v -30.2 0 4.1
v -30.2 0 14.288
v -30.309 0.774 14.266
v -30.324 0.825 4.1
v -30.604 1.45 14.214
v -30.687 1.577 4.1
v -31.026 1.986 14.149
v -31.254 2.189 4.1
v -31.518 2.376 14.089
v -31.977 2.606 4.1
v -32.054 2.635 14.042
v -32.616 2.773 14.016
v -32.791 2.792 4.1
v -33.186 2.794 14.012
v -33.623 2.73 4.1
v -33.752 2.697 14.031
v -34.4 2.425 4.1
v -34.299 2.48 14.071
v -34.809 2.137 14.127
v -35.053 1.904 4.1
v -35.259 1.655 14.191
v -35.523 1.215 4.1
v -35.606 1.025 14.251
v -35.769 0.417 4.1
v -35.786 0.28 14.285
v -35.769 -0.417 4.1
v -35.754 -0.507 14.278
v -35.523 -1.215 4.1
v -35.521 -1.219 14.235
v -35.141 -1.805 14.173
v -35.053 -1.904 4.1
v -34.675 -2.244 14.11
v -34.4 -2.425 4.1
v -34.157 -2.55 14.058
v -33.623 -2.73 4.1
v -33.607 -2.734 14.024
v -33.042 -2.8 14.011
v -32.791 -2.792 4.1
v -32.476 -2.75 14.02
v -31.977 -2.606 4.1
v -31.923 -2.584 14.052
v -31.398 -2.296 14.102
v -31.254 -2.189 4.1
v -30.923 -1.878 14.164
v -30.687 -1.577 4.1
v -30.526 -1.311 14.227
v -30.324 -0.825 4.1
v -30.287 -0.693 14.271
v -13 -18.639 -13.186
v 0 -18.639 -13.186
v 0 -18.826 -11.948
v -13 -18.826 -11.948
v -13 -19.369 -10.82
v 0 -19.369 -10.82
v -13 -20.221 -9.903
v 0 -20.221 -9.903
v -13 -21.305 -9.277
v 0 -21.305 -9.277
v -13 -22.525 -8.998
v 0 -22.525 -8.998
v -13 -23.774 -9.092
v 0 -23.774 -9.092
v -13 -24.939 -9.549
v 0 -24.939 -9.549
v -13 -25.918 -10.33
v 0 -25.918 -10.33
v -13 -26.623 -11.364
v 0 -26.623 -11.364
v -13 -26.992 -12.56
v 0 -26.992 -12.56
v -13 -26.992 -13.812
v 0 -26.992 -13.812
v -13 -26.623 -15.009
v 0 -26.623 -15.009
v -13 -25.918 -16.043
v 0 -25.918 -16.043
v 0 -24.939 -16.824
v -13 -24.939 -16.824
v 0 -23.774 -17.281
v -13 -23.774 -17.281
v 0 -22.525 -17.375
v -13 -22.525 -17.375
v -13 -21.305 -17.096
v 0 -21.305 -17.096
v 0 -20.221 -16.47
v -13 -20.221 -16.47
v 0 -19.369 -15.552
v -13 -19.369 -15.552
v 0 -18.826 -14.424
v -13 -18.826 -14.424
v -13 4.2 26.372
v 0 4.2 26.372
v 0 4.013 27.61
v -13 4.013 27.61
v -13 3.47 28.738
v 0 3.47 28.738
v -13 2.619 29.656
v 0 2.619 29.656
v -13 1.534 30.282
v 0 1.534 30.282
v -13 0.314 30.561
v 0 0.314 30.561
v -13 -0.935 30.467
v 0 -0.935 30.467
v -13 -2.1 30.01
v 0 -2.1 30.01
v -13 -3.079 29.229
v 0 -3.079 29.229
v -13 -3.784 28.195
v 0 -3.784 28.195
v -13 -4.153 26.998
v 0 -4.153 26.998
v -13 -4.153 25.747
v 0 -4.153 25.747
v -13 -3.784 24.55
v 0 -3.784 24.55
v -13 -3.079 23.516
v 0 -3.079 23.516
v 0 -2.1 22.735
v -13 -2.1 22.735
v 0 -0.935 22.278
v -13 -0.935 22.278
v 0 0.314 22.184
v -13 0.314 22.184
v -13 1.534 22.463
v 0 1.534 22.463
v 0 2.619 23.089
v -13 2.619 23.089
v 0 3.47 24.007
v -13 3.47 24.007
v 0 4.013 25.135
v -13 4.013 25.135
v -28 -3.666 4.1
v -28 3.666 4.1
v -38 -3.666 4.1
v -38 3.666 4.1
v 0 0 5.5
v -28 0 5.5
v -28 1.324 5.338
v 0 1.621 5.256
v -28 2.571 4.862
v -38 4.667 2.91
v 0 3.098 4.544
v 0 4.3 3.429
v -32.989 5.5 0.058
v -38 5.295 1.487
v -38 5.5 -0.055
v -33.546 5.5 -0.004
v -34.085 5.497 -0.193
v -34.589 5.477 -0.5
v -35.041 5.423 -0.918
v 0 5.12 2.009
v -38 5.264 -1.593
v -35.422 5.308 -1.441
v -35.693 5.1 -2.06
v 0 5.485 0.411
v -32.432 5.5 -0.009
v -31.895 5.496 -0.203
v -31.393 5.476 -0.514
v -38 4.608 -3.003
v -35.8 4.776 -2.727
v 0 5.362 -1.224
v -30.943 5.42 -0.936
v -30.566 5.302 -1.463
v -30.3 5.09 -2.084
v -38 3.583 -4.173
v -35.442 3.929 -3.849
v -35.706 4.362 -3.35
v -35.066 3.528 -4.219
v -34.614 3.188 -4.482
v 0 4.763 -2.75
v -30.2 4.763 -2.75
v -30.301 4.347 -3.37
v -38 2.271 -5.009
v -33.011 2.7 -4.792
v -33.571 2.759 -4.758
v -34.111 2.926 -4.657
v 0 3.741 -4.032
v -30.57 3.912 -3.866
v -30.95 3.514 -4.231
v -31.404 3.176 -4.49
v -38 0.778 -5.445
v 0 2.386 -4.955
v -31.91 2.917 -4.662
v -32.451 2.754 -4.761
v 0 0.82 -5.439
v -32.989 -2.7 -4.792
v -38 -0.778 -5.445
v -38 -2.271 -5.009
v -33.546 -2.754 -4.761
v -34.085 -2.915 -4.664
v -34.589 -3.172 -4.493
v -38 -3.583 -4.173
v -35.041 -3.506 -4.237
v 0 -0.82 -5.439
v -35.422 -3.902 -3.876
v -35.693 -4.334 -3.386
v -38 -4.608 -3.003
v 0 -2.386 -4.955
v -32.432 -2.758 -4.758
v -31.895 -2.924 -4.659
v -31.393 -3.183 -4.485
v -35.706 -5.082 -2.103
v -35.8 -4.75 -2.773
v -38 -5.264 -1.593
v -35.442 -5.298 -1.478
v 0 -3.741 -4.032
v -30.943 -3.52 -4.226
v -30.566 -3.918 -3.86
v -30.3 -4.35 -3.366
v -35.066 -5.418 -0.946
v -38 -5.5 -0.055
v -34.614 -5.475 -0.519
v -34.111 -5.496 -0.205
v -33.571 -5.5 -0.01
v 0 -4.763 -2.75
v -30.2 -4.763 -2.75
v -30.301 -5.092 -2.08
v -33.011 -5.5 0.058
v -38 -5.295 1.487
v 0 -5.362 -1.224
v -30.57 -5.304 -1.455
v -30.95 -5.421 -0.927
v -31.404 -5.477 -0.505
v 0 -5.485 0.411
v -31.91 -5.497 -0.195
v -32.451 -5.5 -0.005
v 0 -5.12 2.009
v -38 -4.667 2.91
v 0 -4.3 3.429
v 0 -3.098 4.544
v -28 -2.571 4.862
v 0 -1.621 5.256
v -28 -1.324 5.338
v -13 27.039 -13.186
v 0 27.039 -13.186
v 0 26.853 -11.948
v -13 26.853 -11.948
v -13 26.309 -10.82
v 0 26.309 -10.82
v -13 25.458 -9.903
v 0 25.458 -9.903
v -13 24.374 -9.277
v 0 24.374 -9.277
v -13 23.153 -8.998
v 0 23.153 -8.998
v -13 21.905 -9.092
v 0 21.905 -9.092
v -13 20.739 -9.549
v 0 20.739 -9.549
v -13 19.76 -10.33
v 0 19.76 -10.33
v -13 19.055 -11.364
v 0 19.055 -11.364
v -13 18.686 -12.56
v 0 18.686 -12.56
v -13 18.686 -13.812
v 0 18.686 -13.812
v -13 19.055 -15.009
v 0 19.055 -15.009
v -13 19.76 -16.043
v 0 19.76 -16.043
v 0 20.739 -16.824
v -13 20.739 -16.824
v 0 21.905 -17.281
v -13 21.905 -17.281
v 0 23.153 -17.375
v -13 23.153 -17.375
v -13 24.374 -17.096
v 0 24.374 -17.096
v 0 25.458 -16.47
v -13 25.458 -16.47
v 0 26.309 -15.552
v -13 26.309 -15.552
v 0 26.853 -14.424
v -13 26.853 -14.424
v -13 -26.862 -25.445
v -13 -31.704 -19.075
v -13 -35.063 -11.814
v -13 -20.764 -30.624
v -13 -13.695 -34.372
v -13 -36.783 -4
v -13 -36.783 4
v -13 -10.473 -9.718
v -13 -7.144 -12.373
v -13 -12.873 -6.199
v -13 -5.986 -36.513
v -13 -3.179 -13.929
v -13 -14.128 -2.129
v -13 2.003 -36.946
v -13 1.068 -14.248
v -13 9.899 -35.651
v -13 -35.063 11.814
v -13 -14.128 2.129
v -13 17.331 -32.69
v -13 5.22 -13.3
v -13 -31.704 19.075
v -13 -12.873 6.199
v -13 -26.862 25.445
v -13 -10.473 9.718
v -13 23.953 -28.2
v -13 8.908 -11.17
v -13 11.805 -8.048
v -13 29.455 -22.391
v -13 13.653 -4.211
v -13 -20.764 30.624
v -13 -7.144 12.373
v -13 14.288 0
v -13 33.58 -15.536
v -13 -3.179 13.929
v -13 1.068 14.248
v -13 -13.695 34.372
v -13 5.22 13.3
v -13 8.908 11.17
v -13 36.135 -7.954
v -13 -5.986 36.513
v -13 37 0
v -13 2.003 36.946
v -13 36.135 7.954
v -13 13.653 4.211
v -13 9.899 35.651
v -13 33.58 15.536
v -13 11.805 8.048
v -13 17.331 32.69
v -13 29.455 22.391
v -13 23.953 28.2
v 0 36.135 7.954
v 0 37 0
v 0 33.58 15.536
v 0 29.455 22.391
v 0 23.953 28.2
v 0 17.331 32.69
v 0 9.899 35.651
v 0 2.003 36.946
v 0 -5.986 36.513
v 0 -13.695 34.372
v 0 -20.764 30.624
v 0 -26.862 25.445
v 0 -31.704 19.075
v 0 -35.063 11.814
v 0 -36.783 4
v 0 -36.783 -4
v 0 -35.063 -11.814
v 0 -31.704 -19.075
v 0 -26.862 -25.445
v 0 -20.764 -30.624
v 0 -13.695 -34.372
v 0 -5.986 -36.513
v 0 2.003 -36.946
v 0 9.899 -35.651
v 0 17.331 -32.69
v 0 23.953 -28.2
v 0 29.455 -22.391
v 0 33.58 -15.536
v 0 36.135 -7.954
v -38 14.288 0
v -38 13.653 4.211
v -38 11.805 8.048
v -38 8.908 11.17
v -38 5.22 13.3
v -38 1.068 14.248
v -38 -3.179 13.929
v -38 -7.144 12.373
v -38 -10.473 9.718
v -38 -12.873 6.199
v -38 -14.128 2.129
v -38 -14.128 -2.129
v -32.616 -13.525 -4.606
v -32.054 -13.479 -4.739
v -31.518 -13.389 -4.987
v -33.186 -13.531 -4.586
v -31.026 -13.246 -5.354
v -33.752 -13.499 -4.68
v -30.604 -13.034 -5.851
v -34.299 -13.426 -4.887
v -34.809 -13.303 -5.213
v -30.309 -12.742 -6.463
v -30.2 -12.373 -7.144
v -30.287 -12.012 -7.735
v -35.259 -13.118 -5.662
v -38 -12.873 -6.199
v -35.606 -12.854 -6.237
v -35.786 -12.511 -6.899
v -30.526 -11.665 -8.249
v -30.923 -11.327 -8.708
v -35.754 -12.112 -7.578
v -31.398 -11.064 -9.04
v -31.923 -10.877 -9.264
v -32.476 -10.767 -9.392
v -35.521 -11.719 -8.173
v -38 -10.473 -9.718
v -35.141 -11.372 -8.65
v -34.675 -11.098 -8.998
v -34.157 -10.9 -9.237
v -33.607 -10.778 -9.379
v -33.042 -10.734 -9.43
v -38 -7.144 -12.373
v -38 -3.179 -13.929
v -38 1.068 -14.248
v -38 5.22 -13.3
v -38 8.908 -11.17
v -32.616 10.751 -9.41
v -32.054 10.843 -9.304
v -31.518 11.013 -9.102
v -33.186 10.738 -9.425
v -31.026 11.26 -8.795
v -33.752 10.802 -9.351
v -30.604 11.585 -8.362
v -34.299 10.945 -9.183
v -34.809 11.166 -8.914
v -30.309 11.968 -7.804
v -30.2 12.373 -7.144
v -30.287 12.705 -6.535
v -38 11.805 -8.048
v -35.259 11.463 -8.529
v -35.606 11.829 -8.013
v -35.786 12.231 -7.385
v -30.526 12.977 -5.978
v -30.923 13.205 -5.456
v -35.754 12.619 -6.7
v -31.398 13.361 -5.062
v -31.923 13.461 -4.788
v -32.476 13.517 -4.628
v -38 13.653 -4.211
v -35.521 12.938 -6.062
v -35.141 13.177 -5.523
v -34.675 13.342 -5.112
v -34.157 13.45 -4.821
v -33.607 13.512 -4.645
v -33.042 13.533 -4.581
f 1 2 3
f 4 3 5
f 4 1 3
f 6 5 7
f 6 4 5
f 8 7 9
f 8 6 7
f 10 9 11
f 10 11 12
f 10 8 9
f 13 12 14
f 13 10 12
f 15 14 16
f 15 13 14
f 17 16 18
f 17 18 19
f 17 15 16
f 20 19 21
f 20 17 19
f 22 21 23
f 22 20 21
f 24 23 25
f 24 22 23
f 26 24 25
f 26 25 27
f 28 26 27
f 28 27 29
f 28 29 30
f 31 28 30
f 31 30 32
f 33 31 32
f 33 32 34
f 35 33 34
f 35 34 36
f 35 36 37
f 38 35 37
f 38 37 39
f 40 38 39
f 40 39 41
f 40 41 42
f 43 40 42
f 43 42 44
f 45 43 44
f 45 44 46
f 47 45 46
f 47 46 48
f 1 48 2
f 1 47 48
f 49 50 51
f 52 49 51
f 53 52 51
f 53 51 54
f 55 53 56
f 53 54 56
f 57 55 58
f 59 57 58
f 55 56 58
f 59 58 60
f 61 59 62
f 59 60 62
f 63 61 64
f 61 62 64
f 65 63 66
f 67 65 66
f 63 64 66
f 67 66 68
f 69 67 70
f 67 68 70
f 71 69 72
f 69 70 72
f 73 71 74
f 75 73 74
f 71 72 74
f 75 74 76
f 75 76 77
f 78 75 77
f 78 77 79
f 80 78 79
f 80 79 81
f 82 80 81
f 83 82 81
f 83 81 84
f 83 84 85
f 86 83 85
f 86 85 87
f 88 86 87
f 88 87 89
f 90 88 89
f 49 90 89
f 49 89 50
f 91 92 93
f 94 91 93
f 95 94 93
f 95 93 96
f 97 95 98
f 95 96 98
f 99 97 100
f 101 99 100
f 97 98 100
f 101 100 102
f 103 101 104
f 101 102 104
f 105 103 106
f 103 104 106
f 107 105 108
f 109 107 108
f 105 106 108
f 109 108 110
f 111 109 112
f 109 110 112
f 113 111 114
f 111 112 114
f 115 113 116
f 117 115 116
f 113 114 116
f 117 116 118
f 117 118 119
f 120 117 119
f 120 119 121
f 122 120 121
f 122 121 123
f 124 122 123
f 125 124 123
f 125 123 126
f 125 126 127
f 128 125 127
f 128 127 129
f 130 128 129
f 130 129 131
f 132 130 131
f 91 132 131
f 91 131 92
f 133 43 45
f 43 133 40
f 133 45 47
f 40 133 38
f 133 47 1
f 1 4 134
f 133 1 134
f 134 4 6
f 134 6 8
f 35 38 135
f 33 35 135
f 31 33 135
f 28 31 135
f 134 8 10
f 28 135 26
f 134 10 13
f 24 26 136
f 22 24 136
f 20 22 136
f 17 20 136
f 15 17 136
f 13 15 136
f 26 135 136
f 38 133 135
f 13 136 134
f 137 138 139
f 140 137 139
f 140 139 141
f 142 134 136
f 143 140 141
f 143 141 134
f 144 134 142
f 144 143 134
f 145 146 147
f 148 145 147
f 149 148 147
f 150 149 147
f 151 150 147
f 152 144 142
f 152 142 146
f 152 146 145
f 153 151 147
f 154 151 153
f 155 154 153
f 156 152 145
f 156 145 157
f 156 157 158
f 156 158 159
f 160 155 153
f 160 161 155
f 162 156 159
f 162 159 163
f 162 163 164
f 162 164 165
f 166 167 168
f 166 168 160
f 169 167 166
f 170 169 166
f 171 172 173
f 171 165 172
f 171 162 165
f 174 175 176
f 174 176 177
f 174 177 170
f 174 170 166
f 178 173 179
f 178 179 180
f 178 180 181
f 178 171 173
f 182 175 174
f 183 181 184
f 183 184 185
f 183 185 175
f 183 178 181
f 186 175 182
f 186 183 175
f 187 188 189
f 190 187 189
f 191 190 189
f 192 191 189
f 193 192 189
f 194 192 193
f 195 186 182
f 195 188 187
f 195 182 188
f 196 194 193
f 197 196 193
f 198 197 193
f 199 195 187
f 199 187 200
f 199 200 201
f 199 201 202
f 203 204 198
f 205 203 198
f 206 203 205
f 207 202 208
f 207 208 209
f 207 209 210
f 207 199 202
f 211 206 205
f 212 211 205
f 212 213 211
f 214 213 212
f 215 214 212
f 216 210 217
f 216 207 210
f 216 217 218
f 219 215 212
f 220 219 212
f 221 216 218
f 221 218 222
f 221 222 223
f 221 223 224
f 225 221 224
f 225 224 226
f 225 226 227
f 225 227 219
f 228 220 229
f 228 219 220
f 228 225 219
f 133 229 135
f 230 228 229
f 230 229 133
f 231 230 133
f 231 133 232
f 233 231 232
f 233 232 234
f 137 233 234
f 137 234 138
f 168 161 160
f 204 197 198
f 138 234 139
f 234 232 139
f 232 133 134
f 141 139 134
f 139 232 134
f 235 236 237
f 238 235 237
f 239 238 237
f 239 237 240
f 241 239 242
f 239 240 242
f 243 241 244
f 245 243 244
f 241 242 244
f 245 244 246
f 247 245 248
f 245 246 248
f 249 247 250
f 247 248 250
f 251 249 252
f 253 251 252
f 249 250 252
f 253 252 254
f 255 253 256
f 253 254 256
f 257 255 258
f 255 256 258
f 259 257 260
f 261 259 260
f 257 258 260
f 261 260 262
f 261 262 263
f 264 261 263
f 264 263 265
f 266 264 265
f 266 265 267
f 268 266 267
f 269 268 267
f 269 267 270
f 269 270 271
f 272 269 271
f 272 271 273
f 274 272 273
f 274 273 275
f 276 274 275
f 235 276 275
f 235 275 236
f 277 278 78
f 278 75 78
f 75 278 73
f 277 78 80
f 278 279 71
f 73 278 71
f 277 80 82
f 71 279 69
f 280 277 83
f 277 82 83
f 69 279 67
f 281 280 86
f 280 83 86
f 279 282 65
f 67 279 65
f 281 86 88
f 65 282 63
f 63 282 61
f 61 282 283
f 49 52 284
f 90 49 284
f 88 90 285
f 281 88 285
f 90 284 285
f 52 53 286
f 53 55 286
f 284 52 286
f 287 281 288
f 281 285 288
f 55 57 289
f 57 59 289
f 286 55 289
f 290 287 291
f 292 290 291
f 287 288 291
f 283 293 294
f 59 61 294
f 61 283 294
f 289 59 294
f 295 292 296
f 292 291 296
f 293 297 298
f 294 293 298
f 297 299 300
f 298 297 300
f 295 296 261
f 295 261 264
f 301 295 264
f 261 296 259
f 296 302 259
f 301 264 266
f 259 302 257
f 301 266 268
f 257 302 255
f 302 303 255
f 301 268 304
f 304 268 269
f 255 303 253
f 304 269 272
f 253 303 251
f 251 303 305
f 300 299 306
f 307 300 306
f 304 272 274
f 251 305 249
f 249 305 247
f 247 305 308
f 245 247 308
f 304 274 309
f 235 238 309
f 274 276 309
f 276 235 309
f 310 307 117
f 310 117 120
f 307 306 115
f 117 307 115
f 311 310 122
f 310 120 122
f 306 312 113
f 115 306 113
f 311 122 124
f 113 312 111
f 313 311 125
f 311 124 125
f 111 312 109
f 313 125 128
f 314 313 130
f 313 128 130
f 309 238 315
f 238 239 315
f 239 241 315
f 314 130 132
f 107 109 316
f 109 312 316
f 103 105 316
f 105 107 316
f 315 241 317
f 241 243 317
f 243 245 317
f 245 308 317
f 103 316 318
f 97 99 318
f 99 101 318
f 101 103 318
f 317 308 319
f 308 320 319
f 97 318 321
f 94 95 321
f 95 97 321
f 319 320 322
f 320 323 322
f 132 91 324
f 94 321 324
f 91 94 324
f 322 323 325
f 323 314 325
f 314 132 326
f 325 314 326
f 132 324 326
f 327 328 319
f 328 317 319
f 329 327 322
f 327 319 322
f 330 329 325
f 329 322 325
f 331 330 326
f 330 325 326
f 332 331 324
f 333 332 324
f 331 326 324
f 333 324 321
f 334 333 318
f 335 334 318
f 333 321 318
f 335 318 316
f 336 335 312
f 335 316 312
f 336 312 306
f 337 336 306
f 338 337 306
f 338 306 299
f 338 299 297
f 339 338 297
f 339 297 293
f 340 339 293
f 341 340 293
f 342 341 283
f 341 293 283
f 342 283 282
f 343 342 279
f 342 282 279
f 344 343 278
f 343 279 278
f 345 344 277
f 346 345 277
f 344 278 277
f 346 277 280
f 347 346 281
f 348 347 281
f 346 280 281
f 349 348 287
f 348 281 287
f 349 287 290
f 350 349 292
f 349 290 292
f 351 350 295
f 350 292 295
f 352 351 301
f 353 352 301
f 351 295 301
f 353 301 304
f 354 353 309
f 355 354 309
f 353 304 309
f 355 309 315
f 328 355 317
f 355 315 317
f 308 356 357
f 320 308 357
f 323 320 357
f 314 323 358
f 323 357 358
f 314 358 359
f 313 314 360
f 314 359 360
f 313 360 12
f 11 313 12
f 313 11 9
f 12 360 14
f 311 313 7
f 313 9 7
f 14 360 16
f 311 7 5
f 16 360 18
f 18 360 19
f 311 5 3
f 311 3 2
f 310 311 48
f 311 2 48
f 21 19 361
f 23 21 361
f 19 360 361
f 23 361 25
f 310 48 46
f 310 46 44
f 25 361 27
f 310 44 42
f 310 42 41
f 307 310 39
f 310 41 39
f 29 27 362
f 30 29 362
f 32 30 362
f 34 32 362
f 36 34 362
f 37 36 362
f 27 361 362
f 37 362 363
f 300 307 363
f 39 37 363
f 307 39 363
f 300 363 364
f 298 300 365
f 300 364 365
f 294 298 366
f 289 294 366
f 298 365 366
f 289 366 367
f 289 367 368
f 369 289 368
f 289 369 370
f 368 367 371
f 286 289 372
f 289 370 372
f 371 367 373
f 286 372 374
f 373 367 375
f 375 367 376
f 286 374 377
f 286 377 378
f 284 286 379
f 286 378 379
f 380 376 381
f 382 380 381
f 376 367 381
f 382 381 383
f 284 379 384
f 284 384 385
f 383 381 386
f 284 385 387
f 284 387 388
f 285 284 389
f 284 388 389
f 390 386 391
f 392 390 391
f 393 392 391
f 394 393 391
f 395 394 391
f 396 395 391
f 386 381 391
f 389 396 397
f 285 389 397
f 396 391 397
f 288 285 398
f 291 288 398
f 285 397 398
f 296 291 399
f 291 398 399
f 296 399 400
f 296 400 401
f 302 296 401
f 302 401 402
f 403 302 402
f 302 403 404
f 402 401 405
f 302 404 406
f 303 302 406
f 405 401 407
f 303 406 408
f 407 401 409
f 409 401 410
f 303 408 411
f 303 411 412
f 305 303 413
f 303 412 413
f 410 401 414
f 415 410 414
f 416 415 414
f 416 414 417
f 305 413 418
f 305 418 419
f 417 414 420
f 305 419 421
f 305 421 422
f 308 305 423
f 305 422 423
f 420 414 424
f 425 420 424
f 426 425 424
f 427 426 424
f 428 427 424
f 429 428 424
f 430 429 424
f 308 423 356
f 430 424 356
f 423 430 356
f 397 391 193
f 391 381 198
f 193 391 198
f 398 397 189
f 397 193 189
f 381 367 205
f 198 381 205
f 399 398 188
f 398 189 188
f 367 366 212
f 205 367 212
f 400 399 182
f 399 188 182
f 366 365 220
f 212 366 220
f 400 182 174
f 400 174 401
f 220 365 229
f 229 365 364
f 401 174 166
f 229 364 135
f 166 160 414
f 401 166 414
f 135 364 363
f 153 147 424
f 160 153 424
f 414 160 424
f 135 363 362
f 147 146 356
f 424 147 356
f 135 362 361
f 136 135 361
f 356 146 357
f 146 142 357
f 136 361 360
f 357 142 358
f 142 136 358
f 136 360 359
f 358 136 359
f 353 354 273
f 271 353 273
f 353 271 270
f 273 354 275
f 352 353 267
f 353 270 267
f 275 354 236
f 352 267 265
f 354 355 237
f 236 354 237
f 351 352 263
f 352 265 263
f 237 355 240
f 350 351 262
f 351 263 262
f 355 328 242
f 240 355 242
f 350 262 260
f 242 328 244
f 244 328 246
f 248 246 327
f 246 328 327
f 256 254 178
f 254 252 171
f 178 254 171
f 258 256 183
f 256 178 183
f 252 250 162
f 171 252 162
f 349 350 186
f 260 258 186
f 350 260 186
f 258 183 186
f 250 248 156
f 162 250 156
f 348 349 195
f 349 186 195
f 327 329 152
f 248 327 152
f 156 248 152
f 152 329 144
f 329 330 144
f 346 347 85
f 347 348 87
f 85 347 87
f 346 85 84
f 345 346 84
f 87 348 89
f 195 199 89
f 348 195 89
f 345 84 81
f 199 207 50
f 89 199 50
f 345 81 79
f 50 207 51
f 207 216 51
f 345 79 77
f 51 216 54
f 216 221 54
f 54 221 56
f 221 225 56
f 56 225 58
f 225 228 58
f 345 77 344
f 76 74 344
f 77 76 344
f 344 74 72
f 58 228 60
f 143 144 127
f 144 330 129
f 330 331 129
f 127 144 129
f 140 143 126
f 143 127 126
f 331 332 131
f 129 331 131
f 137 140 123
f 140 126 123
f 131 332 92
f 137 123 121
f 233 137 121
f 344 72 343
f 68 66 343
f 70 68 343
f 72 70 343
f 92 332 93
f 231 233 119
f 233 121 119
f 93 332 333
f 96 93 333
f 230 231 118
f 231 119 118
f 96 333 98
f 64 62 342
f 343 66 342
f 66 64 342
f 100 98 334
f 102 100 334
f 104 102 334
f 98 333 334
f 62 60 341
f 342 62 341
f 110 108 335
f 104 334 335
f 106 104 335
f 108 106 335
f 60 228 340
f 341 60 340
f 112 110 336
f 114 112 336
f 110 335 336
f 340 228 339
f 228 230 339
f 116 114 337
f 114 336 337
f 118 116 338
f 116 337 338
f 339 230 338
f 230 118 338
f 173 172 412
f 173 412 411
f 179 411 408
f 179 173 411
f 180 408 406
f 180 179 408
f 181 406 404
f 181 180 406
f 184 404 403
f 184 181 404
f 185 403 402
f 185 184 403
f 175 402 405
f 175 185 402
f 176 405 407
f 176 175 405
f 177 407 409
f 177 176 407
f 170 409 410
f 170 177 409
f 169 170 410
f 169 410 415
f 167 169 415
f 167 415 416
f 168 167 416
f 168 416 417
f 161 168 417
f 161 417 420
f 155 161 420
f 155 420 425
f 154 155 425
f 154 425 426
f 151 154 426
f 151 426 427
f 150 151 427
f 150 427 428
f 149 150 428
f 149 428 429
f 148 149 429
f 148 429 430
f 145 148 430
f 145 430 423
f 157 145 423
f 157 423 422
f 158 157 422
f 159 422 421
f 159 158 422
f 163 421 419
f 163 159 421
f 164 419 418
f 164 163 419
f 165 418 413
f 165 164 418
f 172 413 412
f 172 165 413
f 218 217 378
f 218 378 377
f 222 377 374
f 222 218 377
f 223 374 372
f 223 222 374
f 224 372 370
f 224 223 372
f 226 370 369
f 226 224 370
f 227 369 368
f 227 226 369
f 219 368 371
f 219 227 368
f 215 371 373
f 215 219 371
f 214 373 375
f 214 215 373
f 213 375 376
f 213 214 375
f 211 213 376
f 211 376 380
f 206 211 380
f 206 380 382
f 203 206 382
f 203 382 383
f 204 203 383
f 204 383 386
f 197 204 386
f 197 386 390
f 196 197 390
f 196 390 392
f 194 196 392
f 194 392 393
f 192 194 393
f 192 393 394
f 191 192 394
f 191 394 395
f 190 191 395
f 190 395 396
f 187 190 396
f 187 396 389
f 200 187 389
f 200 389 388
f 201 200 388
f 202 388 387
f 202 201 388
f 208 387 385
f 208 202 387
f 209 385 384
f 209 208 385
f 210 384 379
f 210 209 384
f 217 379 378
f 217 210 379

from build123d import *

# Parameters (mm, degrees)
CYLINDER_R              = 2.8
CYLINDER_DEPTH          = 100
ARRAY_COUNT             = 3
CYLINDER001_R           = 5.5
CYLINDER001_DEPTH       = 38
CYLINDER001_PITCH_ANGLE = -90
SKETCH003_W             = 6
SKETCH003_H             = 20
POCKET_DEPTH            = 10
SKETCH002_R             = 4.2
PAD_DEPTH               = 38


with BuildPart() as set_screw_array:
    # Cylinder → Cylinder (new body)
    with BuildSketch(Plane(origin=(-33, 0, 0), x_dir=(1, 0, 0), z_dir=(0, 0, 1))):
        Circle(CYLINDER_R)
    extrude(amount=CYLINDER_DEPTH)

    # Array: Set Screw Array ×3 about axis
    array_axis = Axis((0, 0, 0), (1, 0, 0))


with BuildPart() as set_screw_array_1:
    add(set_screw_array.part)
    for i in range(1, ARRAY_COUNT):
        add(set_screw_array.part.rotate(array_axis, i * 360 / ARRAY_COUNT))


with BuildPart() as pocket:
    # Cylinder001 → Cylinder001 (new body)
    with BuildSketch(Plane.XY):
        Circle(CYLINDER001_R)
    extrude(amount=CYLINDER001_DEPTH)


with BuildPart() as pocket_1:
    # Cylinder001 pitch: moved
    add(pocket.part.rotate(Axis((0, 0, 0), (0, 1, 0)), CYLINDER001_PITCH_ANGLE))


with BuildPart() as pocket_2:
    # Cylinder001 placement: moved
    add(pocket_1.part)

    # Sketch003 → Pocket (cut)
    with BuildSketch(Plane.ZY.offset(38)):
        with Locations((7.1, 0)):
            Rectangle(SKETCH003_W, SKETCH003_H)
    extrude(amount=-POCKET_DEPTH, mode=Mode.SUBTRACT)


with BuildPart() as pad:
    # Sketch002 → Pad (new body)
    with BuildSketch(Plane.YZ):
        with Locations((0, 26.3725)):
            Circle(SKETCH002_R)
        with Locations((-22.839255, -13.18625)):
            Circle(SKETCH002_R)
        with Locations((22.839255, -13.18625)):
            Circle(SKETCH002_R)
    extrude(amount=-PAD_DEPTH)


with BuildPart() as cut002:
    # Sketch → Revolution (revolve)
    with BuildSketch(Plane.XY):
        Polygon((0, 37), (-13, 37), (-13, 14.2875), (-38, 14.2875), (-38, 0), (0, 0), align=None)
    revolve(axis=Axis((0, 0, 0), (1, 0, 0)))

    # Cut: cut Pad
    add(pad.part, mode=Mode.SUBTRACT)

    # Cut001: cut Pocket
    add(pocket_2.part, mode=Mode.SUBTRACT)

    # Cut002: cut Set Screw Array
    add(set_screw_array_1.part, mode=Mode.SUBTRACT)


solid = cut002.part
